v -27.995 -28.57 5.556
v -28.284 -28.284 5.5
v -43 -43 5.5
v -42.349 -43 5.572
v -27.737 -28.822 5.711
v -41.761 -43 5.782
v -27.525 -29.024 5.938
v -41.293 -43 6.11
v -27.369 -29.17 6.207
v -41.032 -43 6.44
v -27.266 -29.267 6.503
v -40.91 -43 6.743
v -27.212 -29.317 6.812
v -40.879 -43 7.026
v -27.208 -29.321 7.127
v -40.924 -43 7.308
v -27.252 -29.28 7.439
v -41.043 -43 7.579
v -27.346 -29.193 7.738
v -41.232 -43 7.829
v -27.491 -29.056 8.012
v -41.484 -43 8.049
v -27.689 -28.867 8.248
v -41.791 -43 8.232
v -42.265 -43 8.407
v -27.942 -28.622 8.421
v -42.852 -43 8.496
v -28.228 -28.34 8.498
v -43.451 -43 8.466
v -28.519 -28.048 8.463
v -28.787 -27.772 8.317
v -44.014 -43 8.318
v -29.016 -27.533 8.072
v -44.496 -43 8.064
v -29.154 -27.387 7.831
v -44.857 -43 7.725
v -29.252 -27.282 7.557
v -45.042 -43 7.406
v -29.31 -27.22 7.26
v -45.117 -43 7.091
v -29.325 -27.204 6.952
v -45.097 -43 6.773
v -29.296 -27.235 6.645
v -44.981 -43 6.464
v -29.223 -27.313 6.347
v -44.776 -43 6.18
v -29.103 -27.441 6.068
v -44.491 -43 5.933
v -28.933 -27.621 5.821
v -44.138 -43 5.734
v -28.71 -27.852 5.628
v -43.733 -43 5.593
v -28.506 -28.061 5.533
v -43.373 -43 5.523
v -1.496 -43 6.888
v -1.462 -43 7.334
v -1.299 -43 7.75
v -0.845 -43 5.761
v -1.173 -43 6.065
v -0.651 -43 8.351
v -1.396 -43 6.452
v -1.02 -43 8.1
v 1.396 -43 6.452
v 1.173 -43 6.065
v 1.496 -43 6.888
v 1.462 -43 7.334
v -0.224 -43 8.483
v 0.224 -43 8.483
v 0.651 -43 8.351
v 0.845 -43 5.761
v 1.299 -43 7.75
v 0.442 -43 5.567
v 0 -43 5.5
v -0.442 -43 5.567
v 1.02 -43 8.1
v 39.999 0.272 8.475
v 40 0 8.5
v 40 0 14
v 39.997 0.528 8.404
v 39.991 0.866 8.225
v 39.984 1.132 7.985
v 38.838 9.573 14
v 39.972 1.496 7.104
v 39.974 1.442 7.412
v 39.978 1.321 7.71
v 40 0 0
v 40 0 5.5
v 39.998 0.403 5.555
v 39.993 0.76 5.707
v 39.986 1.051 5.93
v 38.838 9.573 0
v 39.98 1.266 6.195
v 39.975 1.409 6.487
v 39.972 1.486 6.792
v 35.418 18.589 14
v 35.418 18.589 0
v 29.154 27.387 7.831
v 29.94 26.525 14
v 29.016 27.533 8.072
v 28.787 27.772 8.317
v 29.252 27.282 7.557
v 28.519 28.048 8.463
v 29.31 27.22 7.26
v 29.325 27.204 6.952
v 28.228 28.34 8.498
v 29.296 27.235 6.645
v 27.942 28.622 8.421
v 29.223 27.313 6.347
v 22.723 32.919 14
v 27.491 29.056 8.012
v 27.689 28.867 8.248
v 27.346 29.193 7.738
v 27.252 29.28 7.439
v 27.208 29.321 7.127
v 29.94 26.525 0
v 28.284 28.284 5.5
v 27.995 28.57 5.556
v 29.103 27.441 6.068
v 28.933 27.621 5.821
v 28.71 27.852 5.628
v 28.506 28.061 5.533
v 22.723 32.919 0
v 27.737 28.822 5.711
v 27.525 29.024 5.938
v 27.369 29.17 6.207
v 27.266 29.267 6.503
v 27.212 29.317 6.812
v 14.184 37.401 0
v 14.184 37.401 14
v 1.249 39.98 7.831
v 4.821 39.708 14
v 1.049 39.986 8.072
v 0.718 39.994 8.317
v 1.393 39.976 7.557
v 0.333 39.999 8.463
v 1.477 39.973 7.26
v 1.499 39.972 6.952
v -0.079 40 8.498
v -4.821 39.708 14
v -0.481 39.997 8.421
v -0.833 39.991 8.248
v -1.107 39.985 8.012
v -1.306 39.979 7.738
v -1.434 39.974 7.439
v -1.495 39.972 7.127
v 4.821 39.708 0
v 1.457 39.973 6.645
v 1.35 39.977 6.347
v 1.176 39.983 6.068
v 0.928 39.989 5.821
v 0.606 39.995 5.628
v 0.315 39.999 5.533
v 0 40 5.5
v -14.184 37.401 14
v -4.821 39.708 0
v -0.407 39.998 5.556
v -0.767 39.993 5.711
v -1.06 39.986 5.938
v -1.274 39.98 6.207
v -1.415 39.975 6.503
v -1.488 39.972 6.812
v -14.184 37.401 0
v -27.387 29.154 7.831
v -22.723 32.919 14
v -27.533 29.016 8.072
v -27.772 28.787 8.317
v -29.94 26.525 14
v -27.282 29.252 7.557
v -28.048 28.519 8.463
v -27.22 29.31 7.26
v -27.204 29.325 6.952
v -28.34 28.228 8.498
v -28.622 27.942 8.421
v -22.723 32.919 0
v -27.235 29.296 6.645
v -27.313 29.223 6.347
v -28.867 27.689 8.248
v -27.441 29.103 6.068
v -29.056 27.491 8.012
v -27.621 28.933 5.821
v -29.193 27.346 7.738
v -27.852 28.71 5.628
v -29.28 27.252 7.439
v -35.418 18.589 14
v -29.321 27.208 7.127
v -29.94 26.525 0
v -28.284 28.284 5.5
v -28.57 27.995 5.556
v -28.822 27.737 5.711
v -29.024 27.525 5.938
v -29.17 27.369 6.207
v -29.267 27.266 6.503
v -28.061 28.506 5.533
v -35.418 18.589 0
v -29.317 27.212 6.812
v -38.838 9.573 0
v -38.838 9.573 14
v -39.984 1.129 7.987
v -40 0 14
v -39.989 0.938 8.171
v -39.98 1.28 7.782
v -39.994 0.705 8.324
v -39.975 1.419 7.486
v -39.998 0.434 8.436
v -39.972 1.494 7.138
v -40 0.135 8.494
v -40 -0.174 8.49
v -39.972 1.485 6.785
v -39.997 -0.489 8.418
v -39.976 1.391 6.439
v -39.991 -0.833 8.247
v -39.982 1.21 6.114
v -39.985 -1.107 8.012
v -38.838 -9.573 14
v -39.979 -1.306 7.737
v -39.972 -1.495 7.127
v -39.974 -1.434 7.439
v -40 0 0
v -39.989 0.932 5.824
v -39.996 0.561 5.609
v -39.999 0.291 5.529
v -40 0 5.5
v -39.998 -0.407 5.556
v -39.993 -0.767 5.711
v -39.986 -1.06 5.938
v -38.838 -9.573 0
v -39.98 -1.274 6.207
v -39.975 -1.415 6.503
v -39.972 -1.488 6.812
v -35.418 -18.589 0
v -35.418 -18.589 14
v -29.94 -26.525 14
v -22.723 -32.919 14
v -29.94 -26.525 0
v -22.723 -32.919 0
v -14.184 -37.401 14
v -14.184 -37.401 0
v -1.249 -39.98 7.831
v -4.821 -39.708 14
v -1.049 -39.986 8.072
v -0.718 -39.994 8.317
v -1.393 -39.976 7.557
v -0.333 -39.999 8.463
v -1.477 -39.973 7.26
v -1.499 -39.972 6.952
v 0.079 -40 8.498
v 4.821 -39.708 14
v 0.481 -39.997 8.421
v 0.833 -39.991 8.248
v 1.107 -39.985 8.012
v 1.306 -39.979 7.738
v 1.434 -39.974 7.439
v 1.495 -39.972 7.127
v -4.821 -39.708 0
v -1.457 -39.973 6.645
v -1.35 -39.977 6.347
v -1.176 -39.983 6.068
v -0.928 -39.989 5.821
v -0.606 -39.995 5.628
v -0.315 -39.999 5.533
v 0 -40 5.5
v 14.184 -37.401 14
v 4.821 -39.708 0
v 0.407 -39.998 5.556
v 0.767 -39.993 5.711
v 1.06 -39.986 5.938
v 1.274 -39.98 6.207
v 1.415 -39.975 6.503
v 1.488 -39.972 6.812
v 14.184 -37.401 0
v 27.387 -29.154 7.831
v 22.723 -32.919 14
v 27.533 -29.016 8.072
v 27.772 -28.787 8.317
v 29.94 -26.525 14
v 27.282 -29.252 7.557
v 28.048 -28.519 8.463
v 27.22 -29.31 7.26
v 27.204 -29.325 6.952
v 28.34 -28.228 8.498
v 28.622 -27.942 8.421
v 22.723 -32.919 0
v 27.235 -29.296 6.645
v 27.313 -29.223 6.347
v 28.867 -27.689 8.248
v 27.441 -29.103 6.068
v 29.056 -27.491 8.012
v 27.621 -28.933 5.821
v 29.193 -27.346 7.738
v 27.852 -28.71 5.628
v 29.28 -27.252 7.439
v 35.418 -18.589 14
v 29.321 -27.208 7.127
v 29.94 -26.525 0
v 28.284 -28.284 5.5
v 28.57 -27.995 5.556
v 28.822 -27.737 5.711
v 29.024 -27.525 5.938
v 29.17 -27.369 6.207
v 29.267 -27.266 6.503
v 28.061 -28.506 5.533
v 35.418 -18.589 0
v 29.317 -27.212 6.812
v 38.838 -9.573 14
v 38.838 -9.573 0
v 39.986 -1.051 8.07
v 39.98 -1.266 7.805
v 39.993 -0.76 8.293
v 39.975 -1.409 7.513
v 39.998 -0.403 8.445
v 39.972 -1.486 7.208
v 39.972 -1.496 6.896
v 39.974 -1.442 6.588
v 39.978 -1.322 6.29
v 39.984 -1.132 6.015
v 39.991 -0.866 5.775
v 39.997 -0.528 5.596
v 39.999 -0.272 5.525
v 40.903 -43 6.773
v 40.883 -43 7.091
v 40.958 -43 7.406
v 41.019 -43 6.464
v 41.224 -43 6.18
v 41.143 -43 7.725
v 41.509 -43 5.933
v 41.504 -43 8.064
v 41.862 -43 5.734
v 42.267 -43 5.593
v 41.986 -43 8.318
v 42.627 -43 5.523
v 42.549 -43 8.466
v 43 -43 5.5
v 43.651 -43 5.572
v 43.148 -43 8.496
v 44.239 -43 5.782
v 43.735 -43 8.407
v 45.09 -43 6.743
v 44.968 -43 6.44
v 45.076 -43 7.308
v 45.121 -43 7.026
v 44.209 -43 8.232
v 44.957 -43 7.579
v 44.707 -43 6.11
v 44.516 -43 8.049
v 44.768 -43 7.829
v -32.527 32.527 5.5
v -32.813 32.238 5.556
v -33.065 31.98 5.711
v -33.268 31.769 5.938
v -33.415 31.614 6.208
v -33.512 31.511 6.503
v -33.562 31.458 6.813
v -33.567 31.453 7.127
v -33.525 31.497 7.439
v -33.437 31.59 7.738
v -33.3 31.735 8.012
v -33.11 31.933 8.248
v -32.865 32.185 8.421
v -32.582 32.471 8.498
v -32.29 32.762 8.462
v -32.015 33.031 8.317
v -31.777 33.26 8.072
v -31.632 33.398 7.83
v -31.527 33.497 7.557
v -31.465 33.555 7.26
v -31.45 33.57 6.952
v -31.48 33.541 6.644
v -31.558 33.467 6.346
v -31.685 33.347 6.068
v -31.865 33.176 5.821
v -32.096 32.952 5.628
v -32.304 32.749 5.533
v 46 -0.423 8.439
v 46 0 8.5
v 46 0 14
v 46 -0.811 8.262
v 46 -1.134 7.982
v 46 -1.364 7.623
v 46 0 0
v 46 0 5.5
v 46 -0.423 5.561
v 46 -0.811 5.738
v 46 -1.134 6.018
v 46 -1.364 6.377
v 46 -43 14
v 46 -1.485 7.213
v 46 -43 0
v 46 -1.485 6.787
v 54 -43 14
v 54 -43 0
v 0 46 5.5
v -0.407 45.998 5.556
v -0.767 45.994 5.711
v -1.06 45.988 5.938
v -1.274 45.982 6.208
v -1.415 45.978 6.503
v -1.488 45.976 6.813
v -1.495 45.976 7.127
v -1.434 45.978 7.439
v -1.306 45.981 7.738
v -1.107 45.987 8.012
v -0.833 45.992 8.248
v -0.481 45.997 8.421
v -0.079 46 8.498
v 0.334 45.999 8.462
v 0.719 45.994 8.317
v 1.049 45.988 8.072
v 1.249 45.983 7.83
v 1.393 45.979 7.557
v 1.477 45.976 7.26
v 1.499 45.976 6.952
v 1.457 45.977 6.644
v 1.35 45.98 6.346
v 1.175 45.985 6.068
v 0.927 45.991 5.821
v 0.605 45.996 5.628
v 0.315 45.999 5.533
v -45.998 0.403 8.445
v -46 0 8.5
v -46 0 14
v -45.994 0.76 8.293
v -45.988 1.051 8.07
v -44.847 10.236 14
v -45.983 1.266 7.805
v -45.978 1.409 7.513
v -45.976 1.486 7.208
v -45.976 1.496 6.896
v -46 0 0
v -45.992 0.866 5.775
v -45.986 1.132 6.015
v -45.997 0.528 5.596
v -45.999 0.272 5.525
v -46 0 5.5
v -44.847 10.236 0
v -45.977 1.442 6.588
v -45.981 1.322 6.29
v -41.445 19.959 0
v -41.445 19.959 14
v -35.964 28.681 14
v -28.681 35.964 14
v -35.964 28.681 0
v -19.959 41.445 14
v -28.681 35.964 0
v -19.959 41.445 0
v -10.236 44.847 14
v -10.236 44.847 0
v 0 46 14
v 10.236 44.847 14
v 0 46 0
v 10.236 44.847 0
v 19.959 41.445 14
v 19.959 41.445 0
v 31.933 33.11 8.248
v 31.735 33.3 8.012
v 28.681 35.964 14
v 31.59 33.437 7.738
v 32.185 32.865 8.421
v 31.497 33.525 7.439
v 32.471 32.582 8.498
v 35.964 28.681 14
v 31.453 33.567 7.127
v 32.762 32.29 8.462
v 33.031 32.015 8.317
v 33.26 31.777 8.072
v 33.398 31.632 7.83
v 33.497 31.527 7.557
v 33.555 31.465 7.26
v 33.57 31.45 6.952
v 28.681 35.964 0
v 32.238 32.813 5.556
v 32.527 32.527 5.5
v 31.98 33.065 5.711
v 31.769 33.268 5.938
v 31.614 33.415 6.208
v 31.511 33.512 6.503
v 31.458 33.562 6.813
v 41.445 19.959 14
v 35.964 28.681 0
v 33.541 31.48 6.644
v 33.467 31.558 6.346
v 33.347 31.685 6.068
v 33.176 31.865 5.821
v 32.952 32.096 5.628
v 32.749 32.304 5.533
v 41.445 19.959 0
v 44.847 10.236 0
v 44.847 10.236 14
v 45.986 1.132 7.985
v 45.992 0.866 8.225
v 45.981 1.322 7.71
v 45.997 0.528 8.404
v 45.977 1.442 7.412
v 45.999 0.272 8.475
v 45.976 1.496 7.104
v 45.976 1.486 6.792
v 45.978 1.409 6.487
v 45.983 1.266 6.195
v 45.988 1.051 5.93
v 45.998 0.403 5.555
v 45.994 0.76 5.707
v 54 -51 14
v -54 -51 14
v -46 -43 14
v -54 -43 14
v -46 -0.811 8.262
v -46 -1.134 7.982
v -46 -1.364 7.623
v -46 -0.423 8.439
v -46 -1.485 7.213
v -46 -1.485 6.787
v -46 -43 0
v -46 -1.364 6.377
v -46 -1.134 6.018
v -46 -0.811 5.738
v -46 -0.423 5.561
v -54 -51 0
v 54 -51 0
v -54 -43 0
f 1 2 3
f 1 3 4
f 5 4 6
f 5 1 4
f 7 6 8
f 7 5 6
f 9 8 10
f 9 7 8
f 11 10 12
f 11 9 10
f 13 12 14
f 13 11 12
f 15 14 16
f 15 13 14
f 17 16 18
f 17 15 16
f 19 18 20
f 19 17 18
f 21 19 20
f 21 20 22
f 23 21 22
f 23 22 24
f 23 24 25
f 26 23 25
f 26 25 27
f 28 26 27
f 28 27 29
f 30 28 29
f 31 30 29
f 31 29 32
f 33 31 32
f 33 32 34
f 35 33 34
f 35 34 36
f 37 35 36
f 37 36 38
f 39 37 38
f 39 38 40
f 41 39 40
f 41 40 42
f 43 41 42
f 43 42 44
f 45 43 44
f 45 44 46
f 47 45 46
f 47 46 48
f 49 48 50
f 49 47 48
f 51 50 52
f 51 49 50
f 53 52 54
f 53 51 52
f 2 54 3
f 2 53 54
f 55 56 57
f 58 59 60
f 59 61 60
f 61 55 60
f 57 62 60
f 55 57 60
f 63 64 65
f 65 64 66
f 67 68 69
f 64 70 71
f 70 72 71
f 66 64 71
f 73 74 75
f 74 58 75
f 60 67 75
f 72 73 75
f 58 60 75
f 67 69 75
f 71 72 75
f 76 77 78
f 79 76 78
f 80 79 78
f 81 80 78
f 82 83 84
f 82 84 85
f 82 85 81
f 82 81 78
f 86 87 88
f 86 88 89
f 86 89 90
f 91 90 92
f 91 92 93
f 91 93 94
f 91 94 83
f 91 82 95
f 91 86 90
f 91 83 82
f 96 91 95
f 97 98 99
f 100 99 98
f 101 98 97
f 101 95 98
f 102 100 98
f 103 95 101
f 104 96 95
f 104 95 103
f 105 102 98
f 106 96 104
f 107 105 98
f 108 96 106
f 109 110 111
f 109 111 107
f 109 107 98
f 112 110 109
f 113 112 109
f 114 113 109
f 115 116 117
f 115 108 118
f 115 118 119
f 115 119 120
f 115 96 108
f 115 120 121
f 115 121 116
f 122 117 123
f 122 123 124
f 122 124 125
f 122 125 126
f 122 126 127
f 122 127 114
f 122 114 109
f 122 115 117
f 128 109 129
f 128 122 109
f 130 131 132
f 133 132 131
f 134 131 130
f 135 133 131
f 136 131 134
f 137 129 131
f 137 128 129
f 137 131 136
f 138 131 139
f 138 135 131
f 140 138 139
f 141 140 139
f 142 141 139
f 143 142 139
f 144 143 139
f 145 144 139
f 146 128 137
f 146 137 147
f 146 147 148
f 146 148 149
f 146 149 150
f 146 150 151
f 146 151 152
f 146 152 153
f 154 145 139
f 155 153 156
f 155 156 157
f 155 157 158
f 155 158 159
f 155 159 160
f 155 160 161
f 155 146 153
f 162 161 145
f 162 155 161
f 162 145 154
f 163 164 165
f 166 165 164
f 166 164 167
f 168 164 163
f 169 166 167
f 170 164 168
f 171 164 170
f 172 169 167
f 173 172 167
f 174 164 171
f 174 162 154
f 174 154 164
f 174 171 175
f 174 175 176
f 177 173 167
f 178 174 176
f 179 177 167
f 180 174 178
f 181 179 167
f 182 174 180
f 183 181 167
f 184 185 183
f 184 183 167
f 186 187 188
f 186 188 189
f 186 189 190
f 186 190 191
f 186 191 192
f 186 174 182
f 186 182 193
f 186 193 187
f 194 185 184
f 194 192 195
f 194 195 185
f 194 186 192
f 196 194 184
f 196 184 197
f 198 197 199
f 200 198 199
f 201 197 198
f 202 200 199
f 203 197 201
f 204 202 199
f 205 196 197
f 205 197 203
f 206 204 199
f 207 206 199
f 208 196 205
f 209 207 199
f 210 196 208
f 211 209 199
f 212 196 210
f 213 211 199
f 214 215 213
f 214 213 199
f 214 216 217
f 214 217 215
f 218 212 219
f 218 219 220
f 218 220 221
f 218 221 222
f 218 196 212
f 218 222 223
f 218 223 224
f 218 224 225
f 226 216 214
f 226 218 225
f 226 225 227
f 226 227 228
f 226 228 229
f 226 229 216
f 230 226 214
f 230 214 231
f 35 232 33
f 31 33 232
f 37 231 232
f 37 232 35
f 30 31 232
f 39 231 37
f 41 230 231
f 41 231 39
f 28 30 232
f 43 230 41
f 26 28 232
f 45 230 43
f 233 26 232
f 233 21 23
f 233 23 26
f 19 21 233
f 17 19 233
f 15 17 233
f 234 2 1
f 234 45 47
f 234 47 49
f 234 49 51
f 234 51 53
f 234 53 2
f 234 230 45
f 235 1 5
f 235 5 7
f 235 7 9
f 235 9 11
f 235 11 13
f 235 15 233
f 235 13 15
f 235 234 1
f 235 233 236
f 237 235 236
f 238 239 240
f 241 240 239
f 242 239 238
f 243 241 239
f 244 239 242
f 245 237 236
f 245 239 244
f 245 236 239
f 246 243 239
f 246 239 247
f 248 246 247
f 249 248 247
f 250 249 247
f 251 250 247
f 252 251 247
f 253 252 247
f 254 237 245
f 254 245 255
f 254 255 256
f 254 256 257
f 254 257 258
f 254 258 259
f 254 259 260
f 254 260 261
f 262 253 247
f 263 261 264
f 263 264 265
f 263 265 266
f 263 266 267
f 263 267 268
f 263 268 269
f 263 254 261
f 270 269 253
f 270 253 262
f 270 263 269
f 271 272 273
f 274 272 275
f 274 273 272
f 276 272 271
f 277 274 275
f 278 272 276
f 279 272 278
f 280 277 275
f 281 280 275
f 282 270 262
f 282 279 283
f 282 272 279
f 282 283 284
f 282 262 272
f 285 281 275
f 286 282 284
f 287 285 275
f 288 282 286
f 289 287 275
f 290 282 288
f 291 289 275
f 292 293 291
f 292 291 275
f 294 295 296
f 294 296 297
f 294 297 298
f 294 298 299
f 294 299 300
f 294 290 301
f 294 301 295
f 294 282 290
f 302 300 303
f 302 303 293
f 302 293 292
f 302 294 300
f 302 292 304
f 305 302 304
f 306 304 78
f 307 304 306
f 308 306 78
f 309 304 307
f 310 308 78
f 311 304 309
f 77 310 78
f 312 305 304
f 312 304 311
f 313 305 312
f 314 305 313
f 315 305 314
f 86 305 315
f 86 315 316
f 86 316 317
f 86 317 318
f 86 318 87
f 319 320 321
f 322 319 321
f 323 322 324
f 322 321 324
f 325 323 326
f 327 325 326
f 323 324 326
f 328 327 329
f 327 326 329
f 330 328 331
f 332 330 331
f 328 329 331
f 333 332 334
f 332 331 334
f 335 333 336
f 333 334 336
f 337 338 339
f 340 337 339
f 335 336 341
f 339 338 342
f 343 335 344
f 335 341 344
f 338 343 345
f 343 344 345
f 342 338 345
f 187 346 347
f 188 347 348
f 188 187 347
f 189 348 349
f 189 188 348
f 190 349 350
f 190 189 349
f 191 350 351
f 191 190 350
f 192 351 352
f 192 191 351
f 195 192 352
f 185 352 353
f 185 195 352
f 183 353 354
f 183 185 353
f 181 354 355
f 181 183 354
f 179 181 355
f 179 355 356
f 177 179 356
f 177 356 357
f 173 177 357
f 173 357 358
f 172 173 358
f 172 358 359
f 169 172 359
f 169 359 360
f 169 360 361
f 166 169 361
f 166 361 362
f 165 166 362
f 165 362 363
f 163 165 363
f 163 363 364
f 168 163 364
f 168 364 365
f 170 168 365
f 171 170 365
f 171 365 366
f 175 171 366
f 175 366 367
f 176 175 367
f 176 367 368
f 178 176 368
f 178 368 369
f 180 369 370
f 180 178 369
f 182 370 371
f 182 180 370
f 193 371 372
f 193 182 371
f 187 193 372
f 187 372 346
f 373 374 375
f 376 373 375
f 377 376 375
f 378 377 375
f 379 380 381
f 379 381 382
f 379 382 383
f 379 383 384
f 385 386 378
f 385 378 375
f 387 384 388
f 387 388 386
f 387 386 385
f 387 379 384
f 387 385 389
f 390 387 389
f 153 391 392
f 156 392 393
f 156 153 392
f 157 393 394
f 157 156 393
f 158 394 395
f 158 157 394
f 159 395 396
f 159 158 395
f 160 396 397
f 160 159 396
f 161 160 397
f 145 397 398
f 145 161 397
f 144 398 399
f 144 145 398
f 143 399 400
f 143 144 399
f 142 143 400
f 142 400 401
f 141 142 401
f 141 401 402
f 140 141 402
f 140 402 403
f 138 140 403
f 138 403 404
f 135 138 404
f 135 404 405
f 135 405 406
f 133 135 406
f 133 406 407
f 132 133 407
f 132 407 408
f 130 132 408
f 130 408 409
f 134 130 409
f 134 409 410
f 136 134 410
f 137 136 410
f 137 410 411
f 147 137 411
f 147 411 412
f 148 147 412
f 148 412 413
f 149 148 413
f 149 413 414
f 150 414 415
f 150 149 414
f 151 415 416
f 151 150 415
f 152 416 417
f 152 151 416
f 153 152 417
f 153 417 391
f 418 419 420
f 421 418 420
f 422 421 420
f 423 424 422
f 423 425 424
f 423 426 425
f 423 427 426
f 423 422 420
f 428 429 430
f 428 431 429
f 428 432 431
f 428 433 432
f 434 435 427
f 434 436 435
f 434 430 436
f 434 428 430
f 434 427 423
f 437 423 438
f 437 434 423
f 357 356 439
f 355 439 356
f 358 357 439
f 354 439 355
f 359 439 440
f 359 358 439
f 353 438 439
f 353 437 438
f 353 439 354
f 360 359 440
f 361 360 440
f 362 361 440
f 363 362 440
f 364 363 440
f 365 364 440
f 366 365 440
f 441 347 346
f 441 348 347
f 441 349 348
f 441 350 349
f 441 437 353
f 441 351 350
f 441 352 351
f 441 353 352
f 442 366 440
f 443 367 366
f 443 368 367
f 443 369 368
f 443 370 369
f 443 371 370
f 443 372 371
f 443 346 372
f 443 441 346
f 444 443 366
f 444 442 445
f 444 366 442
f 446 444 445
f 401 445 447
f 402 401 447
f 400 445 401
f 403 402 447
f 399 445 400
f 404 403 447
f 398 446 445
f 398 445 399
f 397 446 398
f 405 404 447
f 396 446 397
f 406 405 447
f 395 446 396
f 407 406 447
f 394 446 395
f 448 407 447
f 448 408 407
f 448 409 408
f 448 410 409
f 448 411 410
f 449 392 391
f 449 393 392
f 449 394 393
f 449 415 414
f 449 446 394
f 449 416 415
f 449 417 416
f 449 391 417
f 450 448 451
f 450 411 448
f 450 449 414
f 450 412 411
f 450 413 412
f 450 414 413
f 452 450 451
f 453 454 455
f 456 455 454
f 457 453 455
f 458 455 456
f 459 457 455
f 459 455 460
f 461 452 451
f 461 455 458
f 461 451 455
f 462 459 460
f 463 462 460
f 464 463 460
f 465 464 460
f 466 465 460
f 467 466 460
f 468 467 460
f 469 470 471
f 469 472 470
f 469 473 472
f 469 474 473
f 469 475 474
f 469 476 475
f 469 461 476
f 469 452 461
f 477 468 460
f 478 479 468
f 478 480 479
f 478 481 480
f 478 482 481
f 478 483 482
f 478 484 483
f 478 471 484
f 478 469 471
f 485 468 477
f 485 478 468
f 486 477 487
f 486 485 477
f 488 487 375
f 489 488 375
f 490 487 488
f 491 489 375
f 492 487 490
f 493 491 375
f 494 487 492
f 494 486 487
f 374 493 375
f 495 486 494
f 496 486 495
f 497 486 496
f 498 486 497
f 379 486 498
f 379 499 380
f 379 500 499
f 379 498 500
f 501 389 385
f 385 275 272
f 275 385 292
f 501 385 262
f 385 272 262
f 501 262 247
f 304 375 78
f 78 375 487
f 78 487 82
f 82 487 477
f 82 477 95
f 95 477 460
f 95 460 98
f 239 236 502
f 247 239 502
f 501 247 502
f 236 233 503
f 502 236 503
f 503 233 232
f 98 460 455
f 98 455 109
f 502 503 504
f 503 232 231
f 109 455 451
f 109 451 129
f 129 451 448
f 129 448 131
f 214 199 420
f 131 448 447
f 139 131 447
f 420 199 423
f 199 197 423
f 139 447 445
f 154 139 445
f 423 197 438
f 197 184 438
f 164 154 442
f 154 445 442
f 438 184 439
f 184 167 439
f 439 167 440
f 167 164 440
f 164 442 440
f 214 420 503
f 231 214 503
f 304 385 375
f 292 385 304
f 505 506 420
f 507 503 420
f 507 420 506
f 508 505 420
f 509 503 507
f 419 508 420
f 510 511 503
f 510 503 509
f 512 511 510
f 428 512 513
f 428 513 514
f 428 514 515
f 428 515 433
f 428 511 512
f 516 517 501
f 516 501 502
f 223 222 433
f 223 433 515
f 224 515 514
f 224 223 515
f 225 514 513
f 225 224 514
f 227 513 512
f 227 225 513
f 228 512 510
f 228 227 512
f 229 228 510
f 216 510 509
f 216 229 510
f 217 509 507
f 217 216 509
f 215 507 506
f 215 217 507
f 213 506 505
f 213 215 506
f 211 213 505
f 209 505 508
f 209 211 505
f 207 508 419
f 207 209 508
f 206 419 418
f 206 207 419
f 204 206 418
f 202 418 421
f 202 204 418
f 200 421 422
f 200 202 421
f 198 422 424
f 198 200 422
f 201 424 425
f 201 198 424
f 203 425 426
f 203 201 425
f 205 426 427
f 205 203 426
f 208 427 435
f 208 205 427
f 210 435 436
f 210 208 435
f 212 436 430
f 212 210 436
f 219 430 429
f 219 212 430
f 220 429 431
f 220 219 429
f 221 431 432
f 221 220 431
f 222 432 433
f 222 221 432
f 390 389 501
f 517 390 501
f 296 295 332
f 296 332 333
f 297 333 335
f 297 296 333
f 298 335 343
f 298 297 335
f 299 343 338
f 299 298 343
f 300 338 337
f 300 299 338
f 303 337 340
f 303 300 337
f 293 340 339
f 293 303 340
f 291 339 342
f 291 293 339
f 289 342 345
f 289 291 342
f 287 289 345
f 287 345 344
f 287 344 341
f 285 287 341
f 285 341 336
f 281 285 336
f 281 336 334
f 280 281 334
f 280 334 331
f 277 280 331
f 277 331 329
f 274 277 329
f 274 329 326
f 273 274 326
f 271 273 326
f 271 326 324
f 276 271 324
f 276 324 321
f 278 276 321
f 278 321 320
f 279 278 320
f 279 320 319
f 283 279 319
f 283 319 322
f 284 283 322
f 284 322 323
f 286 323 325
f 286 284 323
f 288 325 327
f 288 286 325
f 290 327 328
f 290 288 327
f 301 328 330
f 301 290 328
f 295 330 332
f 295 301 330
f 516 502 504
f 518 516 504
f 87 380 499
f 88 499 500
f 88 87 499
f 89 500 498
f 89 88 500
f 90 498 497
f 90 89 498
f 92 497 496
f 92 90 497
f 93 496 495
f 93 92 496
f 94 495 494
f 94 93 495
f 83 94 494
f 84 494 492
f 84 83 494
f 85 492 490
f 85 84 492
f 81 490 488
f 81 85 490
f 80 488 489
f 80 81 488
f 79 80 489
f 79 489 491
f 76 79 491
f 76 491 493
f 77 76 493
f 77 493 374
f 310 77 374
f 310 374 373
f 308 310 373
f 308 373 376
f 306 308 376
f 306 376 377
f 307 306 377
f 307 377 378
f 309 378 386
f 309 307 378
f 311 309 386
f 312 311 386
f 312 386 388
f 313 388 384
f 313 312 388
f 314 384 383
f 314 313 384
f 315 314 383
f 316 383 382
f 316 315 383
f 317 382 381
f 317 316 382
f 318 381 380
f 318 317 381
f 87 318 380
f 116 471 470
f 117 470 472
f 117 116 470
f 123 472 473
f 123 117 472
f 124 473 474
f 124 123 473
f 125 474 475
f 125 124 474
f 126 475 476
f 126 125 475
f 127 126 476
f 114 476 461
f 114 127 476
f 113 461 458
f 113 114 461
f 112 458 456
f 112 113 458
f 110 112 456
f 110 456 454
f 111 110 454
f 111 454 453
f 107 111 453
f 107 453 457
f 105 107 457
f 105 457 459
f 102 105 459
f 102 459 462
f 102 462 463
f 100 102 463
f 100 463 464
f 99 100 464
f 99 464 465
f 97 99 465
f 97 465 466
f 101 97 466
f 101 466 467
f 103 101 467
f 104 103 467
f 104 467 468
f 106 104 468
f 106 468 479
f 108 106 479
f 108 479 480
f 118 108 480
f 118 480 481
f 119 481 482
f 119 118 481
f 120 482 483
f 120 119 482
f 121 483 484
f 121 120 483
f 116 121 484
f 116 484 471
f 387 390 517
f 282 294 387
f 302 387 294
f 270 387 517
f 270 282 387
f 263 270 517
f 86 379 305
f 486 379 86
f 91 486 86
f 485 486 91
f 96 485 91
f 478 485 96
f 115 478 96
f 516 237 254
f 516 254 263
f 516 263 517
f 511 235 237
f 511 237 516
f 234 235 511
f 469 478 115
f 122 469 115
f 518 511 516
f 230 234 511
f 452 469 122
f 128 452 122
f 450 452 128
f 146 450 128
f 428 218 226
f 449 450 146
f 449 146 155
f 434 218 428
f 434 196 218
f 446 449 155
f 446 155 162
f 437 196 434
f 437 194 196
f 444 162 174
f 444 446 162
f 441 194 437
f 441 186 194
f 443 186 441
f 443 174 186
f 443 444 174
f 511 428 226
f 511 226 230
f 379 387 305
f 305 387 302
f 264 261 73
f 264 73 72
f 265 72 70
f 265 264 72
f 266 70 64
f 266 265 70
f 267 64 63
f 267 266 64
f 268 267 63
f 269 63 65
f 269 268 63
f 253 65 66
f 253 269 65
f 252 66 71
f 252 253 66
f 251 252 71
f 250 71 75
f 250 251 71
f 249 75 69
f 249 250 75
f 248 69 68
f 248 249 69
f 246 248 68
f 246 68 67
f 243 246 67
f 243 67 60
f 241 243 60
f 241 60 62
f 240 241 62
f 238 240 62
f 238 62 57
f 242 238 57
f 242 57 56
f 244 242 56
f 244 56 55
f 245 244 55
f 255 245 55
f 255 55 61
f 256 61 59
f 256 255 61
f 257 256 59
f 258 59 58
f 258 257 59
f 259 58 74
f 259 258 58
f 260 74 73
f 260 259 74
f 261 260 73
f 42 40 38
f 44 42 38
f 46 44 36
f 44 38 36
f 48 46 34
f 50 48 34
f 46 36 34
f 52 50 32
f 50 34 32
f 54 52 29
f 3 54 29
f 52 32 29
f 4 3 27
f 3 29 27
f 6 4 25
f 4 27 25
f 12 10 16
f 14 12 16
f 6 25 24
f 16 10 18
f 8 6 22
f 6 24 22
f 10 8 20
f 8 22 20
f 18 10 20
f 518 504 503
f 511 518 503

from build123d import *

# Parameters (mm, degrees)
SKETCH1_R           = 40
BOSS_EXTRUDE1_DEPTH = 14
SKETCH2_R           = 1.5
CUT_EXTRUDE1_DEPTH  = 76.584389923
CIRPATTERN1_COUNT   = 8
SKETCH5_W           = 108
SKETCH5_H           = 14
BOSS_EXTRUDE2_DEPTH = 8


with BuildPart() as part:
    # Sketch1 → Boss-Extrude1 (new body)
    with BuildSketch(Plane.XY):
        with BuildLine():
            Line((46, -46), (54, -46))
            Line((54, -46), (54, -51))
            Line((54, -51), (-54, -51))
            Line((-54, -51), (-54, -46))
            Line((-54, -46), (-46, -46))
            Line((-46, -46), (-46, 0))
            ThreePointArc((-46, 0), (0, 46), (46, 0))
            Line((46, 0), (46, -46))
        make_face()
        Circle(SKETCH1_R, mode=Mode.SUBTRACT)
    extrude(amount=BOSS_EXTRUDE1_DEPTH)

    # Sketch2 → Cut-Extrude1 (cut, through all)
    with BuildSketch(Plane(origin=(0, 0, 0), x_dir=(1, 0, 0), z_dir=(0, 1, 0))):
        with Locations(Location((0, -7, 0), (0, 0, 90))):
            Circle(SKETCH2_R)
    cut_extrude1 = extrude(amount=CUT_EXTRUDE1_DEPTH, mode=Mode.SUBTRACT)

    # CirPattern1: Cut-Extrude1 ×8 about axis
    cirpattern1_axis = Axis((0, 0, 0), (0, 0, 1))
    for i in range(1, CIRPATTERN1_COUNT):
        add(cut_extrude1.rotate(cirpattern1_axis, i * 360 / CIRPATTERN1_COUNT), mode=Mode.SUBTRACT)

    # Sketch5 → Boss-Extrude2 (add)
    with BuildSketch(Plane.XZ.offset(51)):
        with Locations((0, 7)):
            Rectangle(SKETCH5_W, SKETCH5_H)
    extrude(amount=-BOSS_EXTRUDE2_DEPTH)


solid = part.part
